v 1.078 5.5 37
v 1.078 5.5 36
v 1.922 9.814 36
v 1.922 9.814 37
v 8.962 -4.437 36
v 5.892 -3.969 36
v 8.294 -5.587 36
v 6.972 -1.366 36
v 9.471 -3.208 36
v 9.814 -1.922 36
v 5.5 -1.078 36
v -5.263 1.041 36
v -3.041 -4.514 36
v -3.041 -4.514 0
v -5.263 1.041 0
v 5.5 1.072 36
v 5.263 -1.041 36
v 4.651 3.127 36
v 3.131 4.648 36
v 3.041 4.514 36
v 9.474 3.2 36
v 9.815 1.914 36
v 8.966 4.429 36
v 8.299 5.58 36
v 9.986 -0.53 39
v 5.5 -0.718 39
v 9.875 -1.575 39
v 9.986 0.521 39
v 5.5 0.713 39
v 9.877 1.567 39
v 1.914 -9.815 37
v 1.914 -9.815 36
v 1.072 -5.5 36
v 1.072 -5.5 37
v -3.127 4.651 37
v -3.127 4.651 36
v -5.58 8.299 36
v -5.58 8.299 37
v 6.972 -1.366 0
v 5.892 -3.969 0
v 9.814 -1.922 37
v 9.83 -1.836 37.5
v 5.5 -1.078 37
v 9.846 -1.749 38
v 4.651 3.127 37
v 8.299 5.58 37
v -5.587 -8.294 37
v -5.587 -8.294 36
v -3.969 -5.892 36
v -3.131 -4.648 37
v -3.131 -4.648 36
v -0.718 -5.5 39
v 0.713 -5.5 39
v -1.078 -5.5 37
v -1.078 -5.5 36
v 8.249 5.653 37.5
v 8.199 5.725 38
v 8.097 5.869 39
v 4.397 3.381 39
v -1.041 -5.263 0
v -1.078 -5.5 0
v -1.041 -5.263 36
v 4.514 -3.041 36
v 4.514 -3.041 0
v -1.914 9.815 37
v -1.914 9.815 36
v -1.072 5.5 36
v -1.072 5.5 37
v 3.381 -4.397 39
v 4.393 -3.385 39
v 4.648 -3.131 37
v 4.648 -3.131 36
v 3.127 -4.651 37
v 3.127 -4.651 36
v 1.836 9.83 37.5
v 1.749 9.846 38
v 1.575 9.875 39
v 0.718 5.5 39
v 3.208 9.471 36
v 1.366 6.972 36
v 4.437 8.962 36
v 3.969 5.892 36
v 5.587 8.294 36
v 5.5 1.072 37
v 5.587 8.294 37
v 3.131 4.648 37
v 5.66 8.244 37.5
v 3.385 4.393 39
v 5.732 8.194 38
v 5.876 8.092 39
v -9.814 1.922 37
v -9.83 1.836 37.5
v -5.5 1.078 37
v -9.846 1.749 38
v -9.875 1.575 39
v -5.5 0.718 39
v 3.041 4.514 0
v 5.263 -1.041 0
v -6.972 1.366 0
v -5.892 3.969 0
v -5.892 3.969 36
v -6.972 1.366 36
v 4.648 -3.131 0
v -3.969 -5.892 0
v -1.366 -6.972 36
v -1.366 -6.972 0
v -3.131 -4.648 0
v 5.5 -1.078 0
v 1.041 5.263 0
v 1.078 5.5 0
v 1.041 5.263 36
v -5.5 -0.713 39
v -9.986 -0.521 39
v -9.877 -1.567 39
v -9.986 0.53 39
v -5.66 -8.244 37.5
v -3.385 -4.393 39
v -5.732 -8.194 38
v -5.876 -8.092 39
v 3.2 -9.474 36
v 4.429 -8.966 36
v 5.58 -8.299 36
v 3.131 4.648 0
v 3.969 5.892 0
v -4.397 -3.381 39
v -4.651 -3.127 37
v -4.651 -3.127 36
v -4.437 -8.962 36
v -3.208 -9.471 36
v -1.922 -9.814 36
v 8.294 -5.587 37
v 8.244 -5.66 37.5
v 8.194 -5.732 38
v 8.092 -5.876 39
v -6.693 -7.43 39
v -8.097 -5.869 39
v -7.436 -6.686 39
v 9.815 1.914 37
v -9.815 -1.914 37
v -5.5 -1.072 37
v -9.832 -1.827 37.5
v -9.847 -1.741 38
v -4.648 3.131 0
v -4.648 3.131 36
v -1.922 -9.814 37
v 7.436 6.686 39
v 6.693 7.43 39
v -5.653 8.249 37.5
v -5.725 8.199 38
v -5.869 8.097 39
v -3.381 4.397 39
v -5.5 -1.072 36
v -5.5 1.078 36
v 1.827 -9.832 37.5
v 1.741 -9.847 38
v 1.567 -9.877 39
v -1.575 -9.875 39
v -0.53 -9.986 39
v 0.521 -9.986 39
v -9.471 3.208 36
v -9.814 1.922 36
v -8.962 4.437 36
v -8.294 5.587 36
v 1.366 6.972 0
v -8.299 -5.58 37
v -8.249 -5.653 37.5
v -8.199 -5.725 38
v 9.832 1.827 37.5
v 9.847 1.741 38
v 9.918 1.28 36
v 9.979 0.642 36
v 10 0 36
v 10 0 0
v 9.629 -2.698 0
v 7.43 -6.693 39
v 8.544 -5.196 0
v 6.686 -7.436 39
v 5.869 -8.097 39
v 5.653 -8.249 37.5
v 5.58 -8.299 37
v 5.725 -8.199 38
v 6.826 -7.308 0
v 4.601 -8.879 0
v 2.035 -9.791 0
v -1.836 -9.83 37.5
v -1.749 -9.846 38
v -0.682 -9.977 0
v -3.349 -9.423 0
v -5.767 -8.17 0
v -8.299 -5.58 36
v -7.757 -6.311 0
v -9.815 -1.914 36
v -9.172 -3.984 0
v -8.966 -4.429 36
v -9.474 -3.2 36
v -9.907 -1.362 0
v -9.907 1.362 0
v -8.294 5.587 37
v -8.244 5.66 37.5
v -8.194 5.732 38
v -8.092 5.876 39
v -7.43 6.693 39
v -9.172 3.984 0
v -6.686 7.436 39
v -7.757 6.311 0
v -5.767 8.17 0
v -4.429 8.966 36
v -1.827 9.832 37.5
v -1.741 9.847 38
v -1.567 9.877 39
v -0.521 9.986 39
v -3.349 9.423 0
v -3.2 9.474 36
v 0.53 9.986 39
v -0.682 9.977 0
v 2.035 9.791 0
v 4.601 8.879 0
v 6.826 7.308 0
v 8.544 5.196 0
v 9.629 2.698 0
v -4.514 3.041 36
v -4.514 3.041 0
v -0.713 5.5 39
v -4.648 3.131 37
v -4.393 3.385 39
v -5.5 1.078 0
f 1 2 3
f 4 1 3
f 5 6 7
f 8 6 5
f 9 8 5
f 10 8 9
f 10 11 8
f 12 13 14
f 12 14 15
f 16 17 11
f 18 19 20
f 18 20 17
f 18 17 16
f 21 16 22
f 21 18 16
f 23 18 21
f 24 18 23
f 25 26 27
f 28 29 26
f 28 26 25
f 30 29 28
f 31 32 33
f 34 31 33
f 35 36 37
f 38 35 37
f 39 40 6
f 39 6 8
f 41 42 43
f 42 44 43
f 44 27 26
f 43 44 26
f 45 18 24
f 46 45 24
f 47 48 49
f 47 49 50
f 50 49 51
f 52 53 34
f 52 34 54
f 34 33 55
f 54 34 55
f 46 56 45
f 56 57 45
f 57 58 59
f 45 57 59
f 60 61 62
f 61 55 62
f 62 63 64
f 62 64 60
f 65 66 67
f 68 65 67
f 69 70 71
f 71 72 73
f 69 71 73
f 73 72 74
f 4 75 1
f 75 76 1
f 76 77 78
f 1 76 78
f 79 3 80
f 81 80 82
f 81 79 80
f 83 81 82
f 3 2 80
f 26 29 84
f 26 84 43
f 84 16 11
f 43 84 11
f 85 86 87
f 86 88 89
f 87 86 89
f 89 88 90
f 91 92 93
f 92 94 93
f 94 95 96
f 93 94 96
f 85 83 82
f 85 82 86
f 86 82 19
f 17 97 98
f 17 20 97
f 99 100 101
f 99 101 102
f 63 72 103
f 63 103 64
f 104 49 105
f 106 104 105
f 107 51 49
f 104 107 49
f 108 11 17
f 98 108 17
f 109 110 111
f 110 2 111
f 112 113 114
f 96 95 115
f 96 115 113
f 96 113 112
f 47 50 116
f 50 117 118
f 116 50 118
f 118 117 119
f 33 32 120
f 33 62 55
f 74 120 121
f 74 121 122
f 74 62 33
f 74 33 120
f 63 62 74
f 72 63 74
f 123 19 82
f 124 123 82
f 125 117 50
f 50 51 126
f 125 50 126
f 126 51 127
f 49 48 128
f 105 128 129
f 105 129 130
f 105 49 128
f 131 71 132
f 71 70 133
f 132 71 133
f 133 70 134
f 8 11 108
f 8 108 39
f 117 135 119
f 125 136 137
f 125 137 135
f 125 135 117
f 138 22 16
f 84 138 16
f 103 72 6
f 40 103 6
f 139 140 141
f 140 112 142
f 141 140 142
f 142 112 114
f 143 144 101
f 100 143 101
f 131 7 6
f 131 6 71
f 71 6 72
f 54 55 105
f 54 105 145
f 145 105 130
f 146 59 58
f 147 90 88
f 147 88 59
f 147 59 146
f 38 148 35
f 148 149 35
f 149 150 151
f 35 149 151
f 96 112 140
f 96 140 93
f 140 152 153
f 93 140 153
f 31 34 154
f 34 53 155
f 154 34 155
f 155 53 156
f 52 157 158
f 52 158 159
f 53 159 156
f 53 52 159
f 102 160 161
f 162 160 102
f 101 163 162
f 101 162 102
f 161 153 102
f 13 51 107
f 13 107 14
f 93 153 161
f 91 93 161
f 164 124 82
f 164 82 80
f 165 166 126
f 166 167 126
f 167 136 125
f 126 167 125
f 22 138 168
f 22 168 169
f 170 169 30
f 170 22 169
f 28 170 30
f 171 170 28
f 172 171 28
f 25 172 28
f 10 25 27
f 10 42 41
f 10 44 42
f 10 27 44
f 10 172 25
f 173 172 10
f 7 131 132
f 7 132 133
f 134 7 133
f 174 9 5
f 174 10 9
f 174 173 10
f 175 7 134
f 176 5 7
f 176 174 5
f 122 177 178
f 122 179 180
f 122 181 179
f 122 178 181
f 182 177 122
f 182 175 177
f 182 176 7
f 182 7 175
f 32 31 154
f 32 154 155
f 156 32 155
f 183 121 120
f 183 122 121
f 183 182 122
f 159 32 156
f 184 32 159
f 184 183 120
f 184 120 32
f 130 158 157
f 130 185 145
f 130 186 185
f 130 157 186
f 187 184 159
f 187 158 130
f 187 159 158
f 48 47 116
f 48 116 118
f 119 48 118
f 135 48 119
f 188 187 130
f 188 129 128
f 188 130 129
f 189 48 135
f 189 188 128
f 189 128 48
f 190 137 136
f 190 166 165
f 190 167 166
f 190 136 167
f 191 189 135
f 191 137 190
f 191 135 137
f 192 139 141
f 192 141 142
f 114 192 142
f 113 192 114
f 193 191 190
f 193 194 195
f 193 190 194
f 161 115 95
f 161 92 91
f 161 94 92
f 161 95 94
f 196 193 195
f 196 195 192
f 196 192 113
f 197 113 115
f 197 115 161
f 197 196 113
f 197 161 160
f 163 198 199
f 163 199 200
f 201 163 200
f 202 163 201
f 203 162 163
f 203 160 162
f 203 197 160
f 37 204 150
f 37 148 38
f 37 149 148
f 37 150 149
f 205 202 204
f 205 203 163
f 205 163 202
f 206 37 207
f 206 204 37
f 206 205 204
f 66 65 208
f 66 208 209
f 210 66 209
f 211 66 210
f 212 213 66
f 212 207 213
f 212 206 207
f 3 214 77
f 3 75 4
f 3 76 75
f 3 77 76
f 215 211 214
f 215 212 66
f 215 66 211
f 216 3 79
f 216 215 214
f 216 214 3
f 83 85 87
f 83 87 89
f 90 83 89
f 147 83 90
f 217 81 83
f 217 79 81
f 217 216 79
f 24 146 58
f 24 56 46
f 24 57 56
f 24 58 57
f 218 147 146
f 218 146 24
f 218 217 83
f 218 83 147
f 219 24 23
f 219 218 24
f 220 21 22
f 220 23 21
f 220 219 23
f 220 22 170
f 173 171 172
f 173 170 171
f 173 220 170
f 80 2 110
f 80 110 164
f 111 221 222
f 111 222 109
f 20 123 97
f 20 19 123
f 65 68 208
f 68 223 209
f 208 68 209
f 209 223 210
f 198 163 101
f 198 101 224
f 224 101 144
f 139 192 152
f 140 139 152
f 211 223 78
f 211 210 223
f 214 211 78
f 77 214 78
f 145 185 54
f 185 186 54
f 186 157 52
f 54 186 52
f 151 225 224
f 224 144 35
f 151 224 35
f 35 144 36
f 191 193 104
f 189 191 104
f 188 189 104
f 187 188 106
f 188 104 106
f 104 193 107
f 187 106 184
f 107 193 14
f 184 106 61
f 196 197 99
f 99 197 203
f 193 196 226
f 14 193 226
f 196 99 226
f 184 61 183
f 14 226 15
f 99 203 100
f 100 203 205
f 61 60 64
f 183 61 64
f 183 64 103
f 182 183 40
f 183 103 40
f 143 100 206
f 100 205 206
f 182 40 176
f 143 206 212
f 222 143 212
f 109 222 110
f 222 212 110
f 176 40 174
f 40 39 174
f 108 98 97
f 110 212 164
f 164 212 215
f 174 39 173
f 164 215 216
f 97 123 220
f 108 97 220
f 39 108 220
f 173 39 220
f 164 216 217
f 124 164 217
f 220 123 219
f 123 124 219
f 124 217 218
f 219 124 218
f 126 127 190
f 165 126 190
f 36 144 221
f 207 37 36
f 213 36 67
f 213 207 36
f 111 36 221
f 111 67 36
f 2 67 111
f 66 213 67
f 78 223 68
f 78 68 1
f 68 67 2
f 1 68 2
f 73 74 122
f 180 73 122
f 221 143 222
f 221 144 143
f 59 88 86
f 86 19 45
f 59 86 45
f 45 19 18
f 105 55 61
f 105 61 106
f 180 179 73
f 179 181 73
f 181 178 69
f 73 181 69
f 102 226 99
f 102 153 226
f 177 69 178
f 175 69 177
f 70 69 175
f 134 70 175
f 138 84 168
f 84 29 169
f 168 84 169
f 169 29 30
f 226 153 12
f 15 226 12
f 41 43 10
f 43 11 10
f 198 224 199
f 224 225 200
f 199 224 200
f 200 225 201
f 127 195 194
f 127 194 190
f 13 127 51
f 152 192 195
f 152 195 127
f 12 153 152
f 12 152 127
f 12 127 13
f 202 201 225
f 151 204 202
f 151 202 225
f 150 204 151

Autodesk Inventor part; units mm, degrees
ref_plane "YZ Plane" through (0, 0, 0) normal (1, 0, 0) x (0, 1, 0)
ref_plane "XZ Plane" through (0, 0, 0) normal (0, 1, 0) x (-1, 0, 0)
ref_plane "XY Plane" through (0, 0, 0) normal (0, 0, 1) x (1, 0, 0)
sketch "Эскиз1" plane through (0, 0, 0) normal (0, 0, 1) x (1, 0, 0)
  circle A0 centre (0, 0) radius 10
  line L0 (-3.8095, 3.8095) -> (3.8095, 3.8095)
  line L1 (3.8095, 3.8095) -> (3.8095, -3.8095)
  line L2 (3.8095, -3.8095) -> (-3.8095, -3.8095)
  line L3 (-3.8095, -3.8095) -> (-3.8095, 3.8095)
  line L4 (-3.8095, 3.8095) -> (3.8095, -3.8095) construction
  line L5 (3.8095, 3.8095) -> (-3.8095, -3.8095) construction
  dimension "d0" = 20
extrude "Выдавливание1" add sketch "Эскиз1" along normal blind 36
sketch "Эскиз2" plane through (0, 0, 36) normal (0, 0, 1) x (1, 0, 0)
  line L0 (-3.8095, 3.8095) -> (3.8095, 3.8095) projected
  circle A0 centre (0, 0) radius 10 projected
  line L1 (9.8151, 1.914) -> (5.5, 1.0725)
  line L2 (5.5, -1.0775) -> (9.8135, -1.9225)
  line L3 (5.5, 0) -> (5.5, 1.0725)
  line L4 (5.5, 1.0725) -> (5.5, -1.0775)
  line L5 (5.587, 8.2937) -> (3.1307, 4.6475)
  line L6 (4.651, 3.1272) -> (8.2986, 5.5797)
  line L7 (3.8891, 3.8891) -> (3.1307, 4.6475)
  line L8 (3.1307, 4.6475) -> (4.651, 3.1272)
  line L9 (-1.914, 9.8151) -> (-1.0725, 5.5)
  line L10 (1.0775, 5.5) -> (1.9225, 9.8135)
  line L11 (0, 5.5) -> (-1.0725, 5.5)
  line L12 (-1.0725, 5.5) -> (1.0775, 5.5)
  line L13 (-8.2937, 5.587) -> (-4.6475, 3.1307)
  line L14 (-3.1272, 4.651) -> (-5.5797, 8.2986)
  line L15 (-3.8891, 3.8891) -> (-4.6475, 3.1307)
  line L16 (-4.6475, 3.1307) -> (-3.1272, 4.651)
  line L17 (-9.8151, -1.914) -> (-5.5, -1.0725)
  line L18 (-5.5, 1.0775) -> (-9.8135, 1.9225)
  line L19 (-5.5, 0) -> (-5.5, -1.0725)
  line L20 (-5.5, -1.0725) -> (-5.5, 1.0775)
  line L21 (-5.587, -8.2937) -> (-3.1307, -4.6475)
  line L22 (-4.651, -3.1272) -> (-8.2986, -5.5797)
  line L23 (-3.8891, -3.8891) -> (-3.1307, -4.6475)
  line L24 (-3.1307, -4.6475) -> (-4.651, -3.1272)
  line L25 (1.914, -9.8151) -> (1.0725, -5.5)
  line L26 (-1.0775, -5.5) -> (-1.9225, -9.8135)
  line L27 (0, -5.5) -> (1.0725, -5.5)
  line L28 (1.0725, -5.5) -> (-1.0775, -5.5)
  line L29 (8.2937, -5.587) -> (4.6475, -3.1307)
  line L30 (3.1272, -4.651) -> (5.5797, -8.2986)
  line L31 (3.8891, -3.8891) -> (4.6475, -3.1307)
  line L32 (4.6475, -3.1307) -> (3.1272, -4.651)
  dimension "d36" = 360
extrude "Выдавливание2" add sketch "Эскиз2" along normal blind 3 contours A0 L2 L4 L3 L1 | L6 L8 L7 L5 A0 | A0 L30 L32 L31 L29 | L10 L12 L11 L9 A0 | A0 L26 L28 L27 L25 | L14 L16 L15 L13 A0 | A0 L22 L24 L23 L21 | L18 L20 L19 L17 A0
chamfer "Фаска1" distance 2 angle 10 1 edges at (4.3588, 6.4706, 39) measured on face at (4.7682, 7.0783, 37)
chamfer "Фаска2" distance 2 angle 10 1 edges at (6.4748, 4.3535, 39) measured on face at (5.8669, 3.9447, 37)
chamfer "Фаска3" distance 2 angle 10 1 edges at (7.6576, 1.4932, 39) measured on face at (8.3768, 1.6335, 37)
chamfer "Фаска4" distance 2 angle 10 1 edges at (7.6567, -1.5, 39) measured on face at (6.9378, -1.3592, 37)
chamfer "Фаска5" distance 2 angle 10 1 edges at (6.4706, -4.3588, 39) measured on face at (7.0783, -4.7682, 37)
chamfer "Фаска6" distance 2 angle 10 1 edges at (4.3535, -6.4748, 39) measured on face at (3.9447, -5.8669, 37)
chamfer "Фаска7" distance 2 angle 10 1 edges at (-1.5, -7.6567, 39) measured on face at (-1.3592, -6.9378, 37)
chamfer "Фаска8" distance 2 angle 10 1 edges at (1.4932, -7.6576, 39) measured on face at (1.6335, -8.3768, 37)
chamfer "Фаска9" distance 2 angle 10 1 edges at (-6.4748, -4.3535, 39) measured on face at (-5.8669, -3.9447, 37)
chamfer "Фаска10" distance 2 angle 10 1 edges at (-4.3588, -6.4706, 39) measured on face at (-4.7682, -7.0783, 37)
chamfer "Фаска11" distance 2 angle 10 1 edges at (-7.6567, 1.5, 39) measured on face at (-6.9378, 1.3592, 37)
chamfer "Фаска12" distance 2 angle 10 1 edges at (-7.6576, -1.4932, 39) measured on face at (-8.3768, -1.6335, 37)
chamfer "Фаска13" distance 2 angle 10 1 edges at (-4.3535, 6.4748, 39) measured on face at (-3.9447, 5.8669, 37)
chamfer "Фаска14" distance 2 angle 10 1 edges at (-6.4706, 4.3588, 39) measured on face at (-7.0783, 4.7682, 37)
chamfer "Фаска15" distance 2 angle 10 1 edges at (1.5, 7.6567, 39) measured on face at (1.3592, 6.9378, 37)
chamfer "Фаска16" distance 2 angle 10 1 edges at (-1.4932, 7.6576, 39) measured on face at (-1.6335, 8.3768, 37)
sketch "Эскиз3" plane through (0, 0, 36) normal (0, 0, 1) x (1, 0, 0)
  point P0 (0, 0)
sketch "Эскиз5" plane through (0, 0, 36) normal (0, 0, 1) x (1, 0, 0)
  point P0 (0, 0)
sketch "Эскиз6" plane through (0, 0, 36) normal (0, 0, 1) x (1, 0, 0)
  line L0 (-1.0725, 5.5) -> (-1.914, 9.8151) projected
  arc A0 (-1.914, 9.8151) -> (-5.5797, 8.2986) centre (0, 0) ccw projected
  line L1 (-5.5797, 8.2986) -> (-3.1272, 4.651) projected
  line L2 (-3.1272, 4.651) -> (-4.6475, 3.1307) projected
  line L3 (-4.6475, 3.1307) -> (-8.2937, 5.587) projected
  arc A1 (-8.2937, 5.587) -> (-9.8135, 1.9225) centre (0, 0) ccw projected
  line L4 (-9.8135, 1.9225) -> (-5.5, 1.0775) projected
  line L5 (-5.5, 1.0775) -> (-5.5, -1.0725) projected
  line L6 (-5.5, -1.0725) -> (-9.8151, -1.914) projected
  arc A2 (-9.8151, -1.914) -> (-8.2986, -5.5797) centre (0, 0) ccw projected
  line L7 (-8.2986, -5.5797) -> (-4.651, -3.1272) projected
  line L8 (-4.651, -3.1272) -> (-3.1307, -4.6475) projected
  line L9 (-3.1307, -4.6475) -> (-5.587, -8.2937) projected
  arc A3 (-5.587, -8.2937) -> (-1.9225, -9.8135) centre (0, 0) ccw projected
  line L10 (-1.9225, -9.8135) -> (-1.0775, -5.5) projected
  line L11 (-1.0775, -5.5) -> (1.0725, -5.5) projected
  line L12 (1.0725, -5.5) -> (1.914, -9.8151) projected
  arc A4 (1.914, -9.8151) -> (5.5797, -8.2986) centre (0, 0) ccw projected
  line L13 (5.5797, -8.2986) -> (3.1272, -4.651) projected
  line L14 (3.1272, -4.651) -> (4.6475, -3.1307) projected
  line L15 (4.6475, -3.1307) -> (8.2937, -5.587) projected
  arc A5 (8.2937, -5.587) -> (9.8135, -1.9225) centre (0, 0) ccw projected
  line L16 (9.8135, -1.9225) -> (5.5, -1.0775) projected
  line L17 (5.5, -1.0775) -> (5.5, 1.0725) projected
  line L18 (5.5, 1.0725) -> (9.8151, 1.914) projected
  arc A6 (9.8151, 1.914) -> (8.2986, 5.5797) centre (0, 0) ccw projected
  line L19 (8.2986, 5.5797) -> (4.651, 3.1272) projected
  line L20 (4.651, 3.1272) -> (3.1307, 4.6475) projected
  line L21 (3.1307, 4.6475) -> (5.587, 8.2937) projected
  arc A7 (5.587, 8.2937) -> (1.9225, 9.8135) centre (0, 0) ccw projected
  line L22 (1.9225, 9.8135) -> (1.0775, 5.5) projected
  line L23 (1.0775, 5.5) -> (-1.0725, 5.5) projected
  line L24 (-3.8095, 3.8095) -> (3.8095, 3.8095) projected
  line L25 (3.8095, 3.8095) -> (3.8095, -3.8095) projected
  line L26 (3.8095, -3.8095) -> (-3.8095, -3.8095) projected
  line L27 (-3.8095, -3.8095) -> (-3.8095, 3.8095) projected
extrude "Выдавливание4" add sketch "Эскиз6" against normal up to surface (36 mm away) contours L24 L25 L26 L27
sketch "Эскиз7" plane through (0, 0, 36) normal (0, 0, 1) x (1, 0, 0)
  line L0 (-5.8493, 2.507) -> (2.507, 5.8493)
  line L1 (2.507, 5.8493) -> (5.8493, -2.507)
  line L2 (5.8493, -2.507) -> (-2.507, -5.8493)
  line L3 (-2.507, -5.8493) -> (-5.8493, 2.507)
  line L4 (-5.8493, 2.507) -> (5.8493, -2.507) construction
  line L5 (2.507, 5.8493) -> (-2.507, -5.8493) construction
  point P0 (0, 0)
  dimension "d95" = 9
  dimension "d96" = 9
extrude "Выдавливание5" cut sketch "Эскиз7" against normal through all
sketch "Эскиз8" plane through (0, 0, 36) normal (0, 0, 1) x (1, 0, 0)
  line L0 (-4.651, -3.1272) -> (-3.1307, -4.6475) projected
  line L1 (-1.0775, -5.5) -> (1.0725, -5.5) projected
  line L2 (-3.1307, -4.6475) -> (-1.0775, -5.5)
  line L3 (-1.0775, -5.5) -> (-1.3659, -6.972)
  line L4 (-1.9225, -9.8135) -> (-1.0775, -5.5) projected
  line L5 (-3.1307, -4.6475) -> (-3.9688, -5.8915)
  line L6 (-3.1307, -4.6475) -> (-5.587, -8.2937) projected
  line L7 (-3.9688, -5.8915) -> (-1.3659, -6.972)
  line L8 (4.6475, -3.1307) -> (5.8915, -3.9688)
  line L9 (5.5, -1.0775) -> (6.972, -1.3659)
  line L10 (4.6475, -3.1307) -> (5.5, -1.0775)
  line L11 (5.8915, -3.9688) -> (6.972, -1.3659)
  line L12 (3.1307, 4.6475) -> (3.9688, 5.8915)
  line L13 (1.0775, 5.5) -> (1.3659, 6.972)
  line L14 (3.1307, 4.6475) -> (1.0775, 5.5)
  line L15 (3.9688, 5.8915) -> (1.3659, 6.972)
  line L16 (-4.6475, 3.1307) -> (-5.8915, 3.9688)
  line L17 (-5.5, 1.0775) -> (-6.972, 1.3659)
  line L18 (-4.6475, 3.1307) -> (-5.5, 1.0775)
  line L19 (-5.8915, 3.9688) -> (-6.972, 1.3659)
  point P0 (0, 0)
  dimension "d99" = 1.5
  dimension "d100" = 1.5
  dimension "d103" = 360
extrude "Выдавливание6" cut sketch "Эскиз8" against normal through all
sketch "Эскиз9" plane through (0, 0, 36) normal (0, 0, 1) x (1, 0, 0)
  line L0 (-1.3659, -6.972) -> (-1.0775, -5.5) projected
  line L1 (-1.0775, -5.5) -> (-1, -5)
  line L2 (-3.1307, -4.6475) -> (-3.9688, -5.8915) projected
  line L3 (-3.1307, -4.6475) -> (-2.4444, -3.6286)
  line L4 (-2.4444, -3.6286) -> (-1, -5)
  line L5 (-3.1307, -4.6475) -> (-1.0775, -5.5)
  line L6 (5.5, -1.0775) -> (5, -1)
  line L7 (4.6475, -3.1307) -> (3.6286, -2.4444)
  line L8 (3.6286, -2.4444) -> (5, -1)
  line L9 (4.6475, -3.1307) -> (5.5, -1.0775)
  line L10 (1.0775, 5.5) -> (1, 5)
  line L11 (3.1307, 4.6475) -> (2.4444, 3.6286)
  line L12 (2.4444, 3.6286) -> (1, 5)
  line L13 (3.1307, 4.6475) -> (1.0775, 5.5)
  line L14 (-5.5, 1.0775) -> (-5, 1)
  line L15 (-4.6475, 3.1307) -> (-3.6286, 2.4444)
  line L16 (-3.6286, 2.4444) -> (-5, 1)
  line L17 (-4.6475, 3.1307) -> (-5.5, 1.0775)
  point P0 (0, 0)
  dimension "d109" = 360
extrude "Выдавливание7" cut sketch "Эскиз9" against normal through all
properties part number "деталь вв"
